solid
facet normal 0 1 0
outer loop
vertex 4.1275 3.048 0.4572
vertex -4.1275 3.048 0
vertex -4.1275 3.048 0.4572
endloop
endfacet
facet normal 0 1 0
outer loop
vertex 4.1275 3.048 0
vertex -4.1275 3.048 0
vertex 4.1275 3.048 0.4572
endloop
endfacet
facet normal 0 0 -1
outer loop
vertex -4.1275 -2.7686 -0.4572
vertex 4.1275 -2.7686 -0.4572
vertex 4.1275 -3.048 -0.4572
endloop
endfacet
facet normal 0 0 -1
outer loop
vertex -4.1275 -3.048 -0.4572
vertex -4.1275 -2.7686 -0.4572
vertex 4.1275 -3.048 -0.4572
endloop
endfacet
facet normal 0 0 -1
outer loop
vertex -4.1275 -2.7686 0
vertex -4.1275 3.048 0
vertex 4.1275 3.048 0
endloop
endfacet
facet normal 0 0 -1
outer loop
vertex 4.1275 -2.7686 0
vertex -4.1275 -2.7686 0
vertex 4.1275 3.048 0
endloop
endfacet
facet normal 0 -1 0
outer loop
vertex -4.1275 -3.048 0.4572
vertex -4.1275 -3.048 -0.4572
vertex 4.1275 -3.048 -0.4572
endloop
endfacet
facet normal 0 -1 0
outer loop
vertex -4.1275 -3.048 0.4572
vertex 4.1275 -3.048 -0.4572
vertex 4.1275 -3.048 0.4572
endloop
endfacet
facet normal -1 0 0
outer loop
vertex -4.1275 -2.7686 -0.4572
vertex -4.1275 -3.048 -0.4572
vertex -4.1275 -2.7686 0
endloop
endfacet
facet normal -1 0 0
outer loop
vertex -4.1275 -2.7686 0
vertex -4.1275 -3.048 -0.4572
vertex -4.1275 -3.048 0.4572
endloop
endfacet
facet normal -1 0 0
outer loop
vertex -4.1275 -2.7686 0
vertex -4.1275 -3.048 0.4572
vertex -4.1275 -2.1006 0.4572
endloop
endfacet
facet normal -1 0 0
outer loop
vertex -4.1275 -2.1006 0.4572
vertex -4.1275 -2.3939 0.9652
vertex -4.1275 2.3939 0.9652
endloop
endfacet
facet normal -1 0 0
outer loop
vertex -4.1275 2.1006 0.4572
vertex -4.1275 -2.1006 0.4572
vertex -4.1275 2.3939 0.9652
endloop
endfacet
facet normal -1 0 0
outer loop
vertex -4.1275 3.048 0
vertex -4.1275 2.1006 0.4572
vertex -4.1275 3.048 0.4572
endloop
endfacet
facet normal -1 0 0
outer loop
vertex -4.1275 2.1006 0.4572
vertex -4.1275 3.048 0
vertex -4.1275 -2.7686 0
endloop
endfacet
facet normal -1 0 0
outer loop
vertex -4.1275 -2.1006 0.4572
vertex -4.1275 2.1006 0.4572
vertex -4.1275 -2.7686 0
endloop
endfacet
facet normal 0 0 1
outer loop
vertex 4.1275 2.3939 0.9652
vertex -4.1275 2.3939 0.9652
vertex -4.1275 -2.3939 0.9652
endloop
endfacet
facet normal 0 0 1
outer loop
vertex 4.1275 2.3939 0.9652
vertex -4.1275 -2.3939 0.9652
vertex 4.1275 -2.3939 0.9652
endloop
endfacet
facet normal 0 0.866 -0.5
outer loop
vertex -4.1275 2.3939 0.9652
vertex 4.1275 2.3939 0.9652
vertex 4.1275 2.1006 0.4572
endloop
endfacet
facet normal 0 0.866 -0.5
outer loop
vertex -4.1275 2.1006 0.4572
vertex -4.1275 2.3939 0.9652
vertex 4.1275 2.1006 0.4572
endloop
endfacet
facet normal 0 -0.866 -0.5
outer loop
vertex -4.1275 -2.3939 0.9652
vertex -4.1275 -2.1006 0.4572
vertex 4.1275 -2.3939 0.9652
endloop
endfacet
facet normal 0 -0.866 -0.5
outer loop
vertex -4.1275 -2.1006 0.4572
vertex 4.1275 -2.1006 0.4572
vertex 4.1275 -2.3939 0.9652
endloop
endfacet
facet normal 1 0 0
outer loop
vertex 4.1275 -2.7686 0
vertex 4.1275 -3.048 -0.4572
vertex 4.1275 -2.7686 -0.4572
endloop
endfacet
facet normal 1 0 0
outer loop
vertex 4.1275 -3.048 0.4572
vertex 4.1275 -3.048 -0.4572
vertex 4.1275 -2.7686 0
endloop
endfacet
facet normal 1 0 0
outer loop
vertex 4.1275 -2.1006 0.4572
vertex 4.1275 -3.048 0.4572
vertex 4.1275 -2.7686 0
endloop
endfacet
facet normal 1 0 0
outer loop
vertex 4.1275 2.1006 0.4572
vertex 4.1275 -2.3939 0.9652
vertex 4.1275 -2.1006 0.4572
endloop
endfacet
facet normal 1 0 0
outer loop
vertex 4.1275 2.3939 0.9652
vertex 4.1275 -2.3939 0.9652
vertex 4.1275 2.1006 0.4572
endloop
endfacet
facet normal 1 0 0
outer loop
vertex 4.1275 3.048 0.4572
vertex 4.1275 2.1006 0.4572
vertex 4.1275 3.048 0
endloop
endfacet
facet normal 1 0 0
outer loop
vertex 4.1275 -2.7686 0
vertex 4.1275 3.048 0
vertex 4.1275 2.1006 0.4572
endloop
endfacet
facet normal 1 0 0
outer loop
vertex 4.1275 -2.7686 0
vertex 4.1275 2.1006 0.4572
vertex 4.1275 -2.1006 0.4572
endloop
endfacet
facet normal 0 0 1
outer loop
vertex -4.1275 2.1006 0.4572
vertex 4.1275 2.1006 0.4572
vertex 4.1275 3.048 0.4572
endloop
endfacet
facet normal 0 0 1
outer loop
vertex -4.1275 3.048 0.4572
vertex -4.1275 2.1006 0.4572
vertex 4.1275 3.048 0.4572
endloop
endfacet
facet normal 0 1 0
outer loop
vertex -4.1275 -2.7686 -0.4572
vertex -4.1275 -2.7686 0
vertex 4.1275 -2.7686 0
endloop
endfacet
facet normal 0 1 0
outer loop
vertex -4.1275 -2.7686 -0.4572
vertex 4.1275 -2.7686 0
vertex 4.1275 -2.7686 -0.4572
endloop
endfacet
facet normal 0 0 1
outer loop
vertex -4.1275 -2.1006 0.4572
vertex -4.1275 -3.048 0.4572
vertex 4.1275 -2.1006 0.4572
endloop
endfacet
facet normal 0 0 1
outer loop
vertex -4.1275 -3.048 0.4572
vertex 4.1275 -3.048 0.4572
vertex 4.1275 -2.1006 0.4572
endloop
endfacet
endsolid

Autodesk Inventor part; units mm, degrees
ref_plane "YZ Plane" through (0, 0, 0) normal (1, 0, 0) x (0, 1, 0)
ref_plane "XZ Plane" through (0, 0, 0) normal (0, 1, 0) x (-1, 0, 0)
ref_plane "XY Plane" through (0, 0, 0) normal (0, 0, 1) x (1, 0, 0)
sketch "Sketch1" plane through (0, 0, 0) normal (0, 0, 1) x (1, 0, 0)
  line L0 (0, 4.2672) -> (0, -4.2672) projected
  line L1 (-5.7785, 0) -> (5.7785, 0) projected
  line L2 (4.1275, -3.048) -> (-4.1275, -3.048)
  line L3 (-4.1275, -3.048) -> (-4.1275, 3.048)
  line L4 (-4.1275, 3.048) -> (4.1275, 3.048)
  line L5 (4.1275, 3.048) -> (4.1275, -3.048)
  line L6 (4.1275, -3.048) -> (-4.1275, 3.048) construction
  line L7 (-4.1275, -3.048) -> (4.1275, 3.048) construction
  point P0 (0, 0)
  dimension "d0" = 8.255
  dimension "d1" = 6.096
extrude "Extrusion1" add sketch "Sketch1" along normal blind 0.9652
sketch "Sketch2" plane through (4.1275, -3.048, 0) normal (1, 0, 0) x (0, 0, -1)
  line L0 (0, 0) -> (-0.9652, 0) projected
  line L1 (-0.9652, 0) -> (-0.9652, 6.096) projected
  line L2 (0, 6.096) -> (0, 0) projected
  line L3 (-0.4572, 0) -> (-0.4572, 0.9474)
  line L4 (-0.4572, 0.9474) -> (-0.9652, 0.6541)
  line L5 (-0.9652, 0.6541) -> (-0.9652, 0)
  line L6 (-0.9652, 0) -> (-0.4572, 0)
  line L7 (-1.1582, 3.048) -> (0.193, 3.048) projected
  point P0 (0, 3.048)
  dimension "d4" = 0.508
  dimension "d5" = 0.9474
  dimension "d6" = 60
  dimension "d15" = 0.6541
  dimension "d16" = 2.1006
extrude "Extrusion2" cut sketch "Sketch2" against normal blind 8.255 contours L0 L1 L4 L3
mirror "Mirror1" about plane through (0, 0, 0) normal (0, 1, 0) of "Extrusion2"
sketch "Sketch4" plane through (0, 0, 0.9652) normal (0, 0, 1) x (1, 0, 0)
  line L0 (0, 4.2672) -> (0, -4.2672) projected
  line L1 (-5.7785, 0) -> (5.7785, 0) projected
  line L2 (-4.1275, 2.3939) -> (-4.1275, -2.3939) projected
  line L3 (4.1275, -1.2192) -> (-4.1275, -1.2192)
  line L4 (-4.1275, -1.2192) -> (-4.1275, 1.2192)
  line L5 (-4.1275, 1.2192) -> (4.1275, 1.2192)
  line L6 (4.1275, 1.2192) -> (4.1275, -1.2192)
  line L7 (4.1275, -1.2192) -> (-4.1275, 1.2192) construction
  line L8 (-4.1275, -1.2192) -> (4.1275, 1.2192) construction
  point P0 (0, 0)
  dimension "d17" = 2.4384
extrude "Extrusion4" [suppressed]
sketch "Sketch5" plane through (0, 0, 0) normal (1, 0, 0) x (0, 1, 0)
  line L0 (3.048, 0) -> (-3.048, 0) projected
  line L1 (-3.048, 0) -> (-3.048, 0.4572) projected
  line L2 (3.048, 0) -> (3.048, 0.4572) projected
  line L3 (-3.048, 0) -> (-2.7686, 0)
  line L4 (-2.7686, 0) -> (-2.7686, -0.4572)
  line L5 (-2.7686, -0.4572) -> (-3.048, -0.4572)
  line L6 (-3.048, -0.4572) -> (-3.048, 0)
  line L7 (3.048, 0) -> (2.7686, 0)
  line L8 (2.7686, 0) -> (2.7686, -0.4572)
  line L9 (2.7686, -0.4572) -> (3.048, -0.4572)
  line L10 (3.048, -0.4572) -> (3.048, 0)
  point P0 (0, 0)
  dimension "d20" = 0.4572
  dimension "d21" = 5.5372
extrude "Extrusion5" add sketch "Sketch5" against normal up to surface (8.255 mm away) from surface at 4.1275 contours L4 L5 L6 L0
properties part number "J007869" material "ALUMINUM, 6061-T651"
